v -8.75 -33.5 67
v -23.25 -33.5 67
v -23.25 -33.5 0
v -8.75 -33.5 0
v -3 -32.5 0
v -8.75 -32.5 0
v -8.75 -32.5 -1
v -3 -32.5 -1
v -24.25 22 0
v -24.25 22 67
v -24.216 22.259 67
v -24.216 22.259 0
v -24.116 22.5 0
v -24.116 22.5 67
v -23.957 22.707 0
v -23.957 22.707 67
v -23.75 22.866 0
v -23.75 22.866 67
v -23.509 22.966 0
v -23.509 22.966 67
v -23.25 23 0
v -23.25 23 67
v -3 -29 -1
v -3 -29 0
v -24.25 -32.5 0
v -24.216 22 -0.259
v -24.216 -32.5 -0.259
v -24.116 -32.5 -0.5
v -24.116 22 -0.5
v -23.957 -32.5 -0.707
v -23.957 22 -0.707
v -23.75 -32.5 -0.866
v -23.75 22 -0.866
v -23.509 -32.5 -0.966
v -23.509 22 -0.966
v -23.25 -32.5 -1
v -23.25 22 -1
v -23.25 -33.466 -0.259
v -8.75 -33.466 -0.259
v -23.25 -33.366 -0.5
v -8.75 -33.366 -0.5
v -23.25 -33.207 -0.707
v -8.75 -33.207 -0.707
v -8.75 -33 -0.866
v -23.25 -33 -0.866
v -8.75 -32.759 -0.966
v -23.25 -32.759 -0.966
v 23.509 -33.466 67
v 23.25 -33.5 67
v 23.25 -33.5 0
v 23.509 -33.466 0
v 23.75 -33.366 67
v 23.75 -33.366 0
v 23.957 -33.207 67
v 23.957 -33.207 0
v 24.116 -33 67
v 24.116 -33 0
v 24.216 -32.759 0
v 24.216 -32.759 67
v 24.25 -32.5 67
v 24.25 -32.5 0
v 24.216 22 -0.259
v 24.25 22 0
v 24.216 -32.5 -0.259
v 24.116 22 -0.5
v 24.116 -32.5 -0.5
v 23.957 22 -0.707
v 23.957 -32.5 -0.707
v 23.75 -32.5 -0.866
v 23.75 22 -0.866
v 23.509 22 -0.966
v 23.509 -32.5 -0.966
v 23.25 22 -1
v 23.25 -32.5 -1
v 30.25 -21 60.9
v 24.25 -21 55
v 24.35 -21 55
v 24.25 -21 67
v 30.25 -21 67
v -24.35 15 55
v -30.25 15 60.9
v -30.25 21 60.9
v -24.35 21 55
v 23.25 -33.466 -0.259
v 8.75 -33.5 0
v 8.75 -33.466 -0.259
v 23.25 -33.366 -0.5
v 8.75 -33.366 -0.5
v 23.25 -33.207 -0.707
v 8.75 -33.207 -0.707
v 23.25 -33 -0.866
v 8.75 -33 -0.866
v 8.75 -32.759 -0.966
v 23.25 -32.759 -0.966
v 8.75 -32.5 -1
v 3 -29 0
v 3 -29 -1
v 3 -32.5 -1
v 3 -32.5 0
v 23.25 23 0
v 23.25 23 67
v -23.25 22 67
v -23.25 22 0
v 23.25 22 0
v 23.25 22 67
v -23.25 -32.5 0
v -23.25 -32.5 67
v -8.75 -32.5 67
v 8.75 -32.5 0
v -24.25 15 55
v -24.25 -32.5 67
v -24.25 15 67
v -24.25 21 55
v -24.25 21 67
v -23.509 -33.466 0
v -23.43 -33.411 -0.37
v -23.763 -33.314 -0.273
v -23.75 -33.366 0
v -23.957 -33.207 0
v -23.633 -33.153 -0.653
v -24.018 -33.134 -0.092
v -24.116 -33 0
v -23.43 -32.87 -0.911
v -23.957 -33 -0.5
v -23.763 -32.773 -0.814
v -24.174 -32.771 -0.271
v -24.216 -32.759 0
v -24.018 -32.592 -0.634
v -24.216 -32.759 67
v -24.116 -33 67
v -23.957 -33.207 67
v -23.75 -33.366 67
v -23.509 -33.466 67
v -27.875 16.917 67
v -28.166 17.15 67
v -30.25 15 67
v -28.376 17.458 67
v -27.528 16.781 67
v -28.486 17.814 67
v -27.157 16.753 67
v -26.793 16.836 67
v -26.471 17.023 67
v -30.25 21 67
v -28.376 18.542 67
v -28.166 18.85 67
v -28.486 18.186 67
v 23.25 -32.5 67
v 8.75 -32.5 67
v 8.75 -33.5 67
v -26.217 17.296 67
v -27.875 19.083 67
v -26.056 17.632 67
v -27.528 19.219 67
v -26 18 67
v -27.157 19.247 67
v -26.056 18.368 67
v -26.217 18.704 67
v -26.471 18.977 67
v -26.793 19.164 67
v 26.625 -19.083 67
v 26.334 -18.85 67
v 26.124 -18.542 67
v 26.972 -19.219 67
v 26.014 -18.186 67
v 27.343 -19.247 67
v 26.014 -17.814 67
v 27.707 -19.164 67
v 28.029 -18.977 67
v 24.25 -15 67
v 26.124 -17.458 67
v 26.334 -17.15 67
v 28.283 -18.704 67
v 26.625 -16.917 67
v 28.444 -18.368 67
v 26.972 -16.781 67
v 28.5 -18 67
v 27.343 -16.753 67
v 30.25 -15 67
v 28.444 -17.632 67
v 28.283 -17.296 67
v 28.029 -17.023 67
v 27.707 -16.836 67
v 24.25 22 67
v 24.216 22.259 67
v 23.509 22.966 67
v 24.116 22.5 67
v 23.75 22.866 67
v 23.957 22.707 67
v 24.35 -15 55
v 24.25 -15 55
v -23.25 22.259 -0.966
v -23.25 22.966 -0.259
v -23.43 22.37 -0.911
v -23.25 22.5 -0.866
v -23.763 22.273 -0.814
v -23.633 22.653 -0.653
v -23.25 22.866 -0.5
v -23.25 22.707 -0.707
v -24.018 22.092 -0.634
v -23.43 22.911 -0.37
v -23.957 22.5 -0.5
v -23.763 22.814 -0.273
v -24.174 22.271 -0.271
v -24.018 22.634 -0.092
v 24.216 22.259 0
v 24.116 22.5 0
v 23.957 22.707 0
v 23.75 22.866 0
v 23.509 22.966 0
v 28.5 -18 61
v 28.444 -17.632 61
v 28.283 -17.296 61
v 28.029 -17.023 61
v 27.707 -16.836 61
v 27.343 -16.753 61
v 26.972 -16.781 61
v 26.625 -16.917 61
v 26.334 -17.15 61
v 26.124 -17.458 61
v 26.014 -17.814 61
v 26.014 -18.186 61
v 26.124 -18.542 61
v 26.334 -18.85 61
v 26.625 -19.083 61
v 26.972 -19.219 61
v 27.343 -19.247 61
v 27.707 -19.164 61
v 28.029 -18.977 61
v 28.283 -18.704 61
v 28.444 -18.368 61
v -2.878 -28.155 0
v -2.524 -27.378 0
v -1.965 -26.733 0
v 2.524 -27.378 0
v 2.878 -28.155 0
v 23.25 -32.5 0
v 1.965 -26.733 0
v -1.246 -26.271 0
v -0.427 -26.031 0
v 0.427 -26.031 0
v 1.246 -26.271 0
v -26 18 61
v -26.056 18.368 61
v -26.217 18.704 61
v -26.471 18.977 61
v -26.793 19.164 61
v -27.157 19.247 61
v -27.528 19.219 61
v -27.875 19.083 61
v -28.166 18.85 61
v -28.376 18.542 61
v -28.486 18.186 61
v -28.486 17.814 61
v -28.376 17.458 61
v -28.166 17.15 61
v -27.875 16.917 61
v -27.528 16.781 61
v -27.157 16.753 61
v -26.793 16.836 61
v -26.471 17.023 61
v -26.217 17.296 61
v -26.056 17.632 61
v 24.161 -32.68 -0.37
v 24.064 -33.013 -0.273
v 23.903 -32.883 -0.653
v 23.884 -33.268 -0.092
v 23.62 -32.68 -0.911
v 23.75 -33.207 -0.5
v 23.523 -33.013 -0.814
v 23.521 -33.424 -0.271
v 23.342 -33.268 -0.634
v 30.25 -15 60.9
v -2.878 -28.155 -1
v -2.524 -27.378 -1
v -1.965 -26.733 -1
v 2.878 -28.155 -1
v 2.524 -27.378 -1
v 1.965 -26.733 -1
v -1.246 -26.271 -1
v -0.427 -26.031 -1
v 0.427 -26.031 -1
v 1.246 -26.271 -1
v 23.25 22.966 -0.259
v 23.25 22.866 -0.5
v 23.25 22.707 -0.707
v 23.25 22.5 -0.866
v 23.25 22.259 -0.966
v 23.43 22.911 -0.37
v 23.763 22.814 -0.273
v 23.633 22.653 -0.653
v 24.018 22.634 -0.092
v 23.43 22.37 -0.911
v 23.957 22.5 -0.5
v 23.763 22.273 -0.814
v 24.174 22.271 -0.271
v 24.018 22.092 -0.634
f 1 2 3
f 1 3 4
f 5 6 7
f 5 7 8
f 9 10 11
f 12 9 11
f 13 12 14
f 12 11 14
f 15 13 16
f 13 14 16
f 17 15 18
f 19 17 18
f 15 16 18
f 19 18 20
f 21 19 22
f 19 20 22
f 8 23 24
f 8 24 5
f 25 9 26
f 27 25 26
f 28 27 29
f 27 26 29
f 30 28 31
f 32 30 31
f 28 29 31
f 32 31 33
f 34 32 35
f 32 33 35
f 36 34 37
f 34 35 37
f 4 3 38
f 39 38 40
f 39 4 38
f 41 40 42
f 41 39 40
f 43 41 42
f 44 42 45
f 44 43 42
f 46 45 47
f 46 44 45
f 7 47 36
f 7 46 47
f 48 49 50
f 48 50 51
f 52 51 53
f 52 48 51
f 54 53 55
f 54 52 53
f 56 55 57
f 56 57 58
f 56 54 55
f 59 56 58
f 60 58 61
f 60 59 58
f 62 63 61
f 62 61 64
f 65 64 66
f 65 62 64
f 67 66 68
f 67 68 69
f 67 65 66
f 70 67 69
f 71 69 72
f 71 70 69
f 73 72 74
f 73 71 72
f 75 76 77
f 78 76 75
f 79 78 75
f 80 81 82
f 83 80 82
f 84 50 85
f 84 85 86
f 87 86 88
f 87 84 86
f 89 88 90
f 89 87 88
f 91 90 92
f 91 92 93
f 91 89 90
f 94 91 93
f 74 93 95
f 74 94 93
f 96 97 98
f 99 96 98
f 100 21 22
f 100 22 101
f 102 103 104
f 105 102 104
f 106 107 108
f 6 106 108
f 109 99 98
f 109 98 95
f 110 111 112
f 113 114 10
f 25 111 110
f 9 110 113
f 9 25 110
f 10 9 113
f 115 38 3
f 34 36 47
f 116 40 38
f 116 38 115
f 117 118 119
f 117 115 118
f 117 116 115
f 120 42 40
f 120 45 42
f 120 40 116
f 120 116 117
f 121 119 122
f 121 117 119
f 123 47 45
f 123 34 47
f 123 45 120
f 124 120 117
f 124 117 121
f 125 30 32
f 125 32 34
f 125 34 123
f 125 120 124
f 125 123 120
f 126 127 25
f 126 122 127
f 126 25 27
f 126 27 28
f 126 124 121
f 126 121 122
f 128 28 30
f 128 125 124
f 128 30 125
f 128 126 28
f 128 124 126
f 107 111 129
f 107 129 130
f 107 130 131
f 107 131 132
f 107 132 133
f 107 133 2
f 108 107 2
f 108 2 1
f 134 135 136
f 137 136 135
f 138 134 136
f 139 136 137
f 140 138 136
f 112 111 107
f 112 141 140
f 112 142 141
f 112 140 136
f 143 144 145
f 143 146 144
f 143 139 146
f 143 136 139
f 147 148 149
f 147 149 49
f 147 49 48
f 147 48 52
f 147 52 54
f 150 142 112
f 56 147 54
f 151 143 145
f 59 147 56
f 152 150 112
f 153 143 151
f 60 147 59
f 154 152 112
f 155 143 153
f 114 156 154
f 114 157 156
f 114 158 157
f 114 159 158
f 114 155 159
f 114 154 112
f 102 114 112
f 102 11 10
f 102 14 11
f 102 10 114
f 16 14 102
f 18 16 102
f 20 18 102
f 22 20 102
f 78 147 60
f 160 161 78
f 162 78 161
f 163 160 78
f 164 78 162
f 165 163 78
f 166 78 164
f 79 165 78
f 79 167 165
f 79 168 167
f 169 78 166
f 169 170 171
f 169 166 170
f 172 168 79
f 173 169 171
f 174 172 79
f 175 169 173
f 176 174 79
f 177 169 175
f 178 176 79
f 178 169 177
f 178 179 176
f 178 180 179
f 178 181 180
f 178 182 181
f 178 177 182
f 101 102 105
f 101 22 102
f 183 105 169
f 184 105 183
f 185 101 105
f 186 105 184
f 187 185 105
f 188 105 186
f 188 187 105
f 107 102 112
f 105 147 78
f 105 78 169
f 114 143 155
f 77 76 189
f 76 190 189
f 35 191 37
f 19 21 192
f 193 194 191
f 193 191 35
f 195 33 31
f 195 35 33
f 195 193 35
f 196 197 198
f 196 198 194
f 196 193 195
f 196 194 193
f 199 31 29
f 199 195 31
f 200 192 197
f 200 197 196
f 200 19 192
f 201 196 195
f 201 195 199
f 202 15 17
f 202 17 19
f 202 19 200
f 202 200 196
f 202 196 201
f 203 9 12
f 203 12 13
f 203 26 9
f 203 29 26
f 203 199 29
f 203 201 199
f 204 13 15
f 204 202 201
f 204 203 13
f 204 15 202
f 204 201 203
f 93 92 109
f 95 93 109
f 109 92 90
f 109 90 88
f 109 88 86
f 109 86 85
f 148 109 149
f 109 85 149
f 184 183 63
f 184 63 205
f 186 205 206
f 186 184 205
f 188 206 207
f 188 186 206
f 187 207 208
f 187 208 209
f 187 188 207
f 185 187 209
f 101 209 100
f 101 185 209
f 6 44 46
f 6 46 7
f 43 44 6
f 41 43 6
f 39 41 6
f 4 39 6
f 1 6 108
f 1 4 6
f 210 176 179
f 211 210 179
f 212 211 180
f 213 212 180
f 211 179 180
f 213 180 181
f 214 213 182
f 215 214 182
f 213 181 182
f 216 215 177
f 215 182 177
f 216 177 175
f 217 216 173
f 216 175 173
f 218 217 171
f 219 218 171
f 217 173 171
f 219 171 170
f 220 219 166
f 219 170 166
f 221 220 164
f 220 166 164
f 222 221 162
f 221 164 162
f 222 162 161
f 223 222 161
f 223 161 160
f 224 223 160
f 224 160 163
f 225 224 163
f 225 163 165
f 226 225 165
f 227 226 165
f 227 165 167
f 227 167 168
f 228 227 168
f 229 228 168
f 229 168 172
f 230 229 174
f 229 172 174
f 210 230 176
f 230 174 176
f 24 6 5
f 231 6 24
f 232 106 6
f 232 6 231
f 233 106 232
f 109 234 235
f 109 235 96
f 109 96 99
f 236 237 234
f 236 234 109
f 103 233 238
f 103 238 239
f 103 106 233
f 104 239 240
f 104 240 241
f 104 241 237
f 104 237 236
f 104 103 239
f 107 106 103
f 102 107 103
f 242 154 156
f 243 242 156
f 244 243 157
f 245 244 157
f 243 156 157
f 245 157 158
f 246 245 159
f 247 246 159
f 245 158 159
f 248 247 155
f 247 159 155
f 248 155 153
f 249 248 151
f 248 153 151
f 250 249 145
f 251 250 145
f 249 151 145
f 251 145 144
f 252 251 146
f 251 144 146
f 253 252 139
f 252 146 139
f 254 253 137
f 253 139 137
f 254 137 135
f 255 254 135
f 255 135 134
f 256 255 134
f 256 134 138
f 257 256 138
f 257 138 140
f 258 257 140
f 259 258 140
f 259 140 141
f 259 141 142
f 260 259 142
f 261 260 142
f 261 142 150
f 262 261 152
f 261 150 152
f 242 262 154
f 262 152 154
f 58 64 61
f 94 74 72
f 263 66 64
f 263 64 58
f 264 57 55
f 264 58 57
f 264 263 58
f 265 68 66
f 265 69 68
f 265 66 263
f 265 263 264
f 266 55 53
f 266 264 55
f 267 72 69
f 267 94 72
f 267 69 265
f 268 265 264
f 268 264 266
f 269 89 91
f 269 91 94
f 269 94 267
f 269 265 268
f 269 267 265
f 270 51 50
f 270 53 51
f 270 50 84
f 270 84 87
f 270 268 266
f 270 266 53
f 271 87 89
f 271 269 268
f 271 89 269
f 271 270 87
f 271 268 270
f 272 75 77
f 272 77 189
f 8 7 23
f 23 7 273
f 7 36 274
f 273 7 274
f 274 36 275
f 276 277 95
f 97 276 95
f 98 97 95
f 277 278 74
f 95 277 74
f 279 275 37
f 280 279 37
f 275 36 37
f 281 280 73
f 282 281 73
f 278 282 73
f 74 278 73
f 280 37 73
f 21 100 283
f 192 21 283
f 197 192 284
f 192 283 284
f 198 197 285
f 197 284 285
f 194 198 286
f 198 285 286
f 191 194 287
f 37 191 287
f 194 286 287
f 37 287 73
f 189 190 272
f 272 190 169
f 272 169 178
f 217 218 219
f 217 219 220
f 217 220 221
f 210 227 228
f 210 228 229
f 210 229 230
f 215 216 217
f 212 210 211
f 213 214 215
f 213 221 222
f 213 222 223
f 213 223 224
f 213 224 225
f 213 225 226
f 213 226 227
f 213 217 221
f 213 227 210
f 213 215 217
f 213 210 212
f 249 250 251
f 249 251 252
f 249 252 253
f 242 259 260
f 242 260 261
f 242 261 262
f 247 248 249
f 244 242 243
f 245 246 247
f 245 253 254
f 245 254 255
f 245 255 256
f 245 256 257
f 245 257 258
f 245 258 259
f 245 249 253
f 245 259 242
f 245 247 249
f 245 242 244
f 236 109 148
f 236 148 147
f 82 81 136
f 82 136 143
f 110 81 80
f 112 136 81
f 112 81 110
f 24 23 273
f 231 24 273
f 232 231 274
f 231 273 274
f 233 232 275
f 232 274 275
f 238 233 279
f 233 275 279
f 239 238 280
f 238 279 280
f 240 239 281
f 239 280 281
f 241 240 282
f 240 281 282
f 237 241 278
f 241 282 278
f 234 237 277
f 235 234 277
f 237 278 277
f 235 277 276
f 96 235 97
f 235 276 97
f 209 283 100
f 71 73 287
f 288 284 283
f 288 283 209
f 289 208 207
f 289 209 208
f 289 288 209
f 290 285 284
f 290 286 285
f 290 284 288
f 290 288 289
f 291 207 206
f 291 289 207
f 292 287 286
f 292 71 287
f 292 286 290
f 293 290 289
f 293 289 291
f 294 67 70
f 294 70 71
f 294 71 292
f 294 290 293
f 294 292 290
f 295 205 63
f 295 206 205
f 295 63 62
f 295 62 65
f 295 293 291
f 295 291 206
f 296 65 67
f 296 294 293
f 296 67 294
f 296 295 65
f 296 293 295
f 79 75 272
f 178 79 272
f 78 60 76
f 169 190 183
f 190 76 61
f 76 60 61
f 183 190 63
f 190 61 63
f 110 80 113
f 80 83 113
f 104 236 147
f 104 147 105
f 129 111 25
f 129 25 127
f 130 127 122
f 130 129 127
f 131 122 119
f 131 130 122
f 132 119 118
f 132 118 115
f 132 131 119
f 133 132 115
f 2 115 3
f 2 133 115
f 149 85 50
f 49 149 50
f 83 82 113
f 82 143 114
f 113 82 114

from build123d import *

# Parameters (mm, degrees)
SKETCH_W        = 46.5
SKETCH_H        = 54.5
PAD_DEPTH       = 67
THICKNESS_T     = 1
SKETCH001_W     = 6
SKETCH001_H     = 6
PAD001_DEPTH    = 12
CHAMFER_SIZE    = 5.9
SKETCH002_R     = 1.25
POCKET_DEPTH    = 6
SKETCH003_W     = 17.5
SKETCH003_H     = 68
POCKET001_DEPTH = 1
POCKET002_DEPTH = 1


with BuildPart() as part:
    # Sketch → Pad (new body)
    with BuildSketch(Plane.XY):
        with Locations((0, -5.25)):
            Rectangle(SKETCH_W, SKETCH_H)
    extrude(amount=PAD_DEPTH)

    # Thickness
    thickness_openings = [part.faces().sort_by_distance(p)[0] for p in [
        (0, -5.25, 67),
    ]]
    offset(amount=THICKNESS_T, openings=thickness_openings)

    # Sketch001 → Pad001 (new body)
    with BuildSketch(Plane.XY.offset(67)):
        with Locations((-27.25, 18)):
            Rectangle(SKETCH001_W, SKETCH001_H)
        with Locations((27.25, -18)):
            Rectangle(SKETCH001_W, SKETCH001_H)
    extrude(amount=-PAD001_DEPTH)

    # Chamfer
    chamfer_edges = [part.edges().sort_by_distance(p)[0] for p in [
        (-30.25, 18, 55),
        (30.25, -18, 55),
    ]]
    chamfer(chamfer_edges, length=CHAMFER_SIZE)

    # Sketch002 → Pocket (cut)
    with BuildSketch(Plane.XY.offset(67)):
        with Locations((-27.25, 18)):
            Circle(SKETCH002_R)
        with Locations((27.25, -18)):
            Circle(SKETCH002_R)
    extrude(amount=-POCKET_DEPTH, mode=Mode.SUBTRACT)

    # Sketch003 → Pocket001 (cut)
    with BuildSketch(Plane.XZ.offset(33.5)):
        with Locations((0, 33)):
            Rectangle(SKETCH003_W, SKETCH003_H)
    extrude(amount=-POCKET001_DEPTH, mode=Mode.SUBTRACT)

    # Sketch004 → Pocket002 (cut)
    with BuildSketch(Plane(origin=(0, 0, -1), x_dir=(1, 0, 0), z_dir=(0, 0, -1))):
        with BuildLine():
            ThreePointArc((-3, 29), (0, 26), (3, 29))
            Line((3, 29), (3, 39))
            ThreePointArc((3, 39), (0, 42), (-3, 39))
            Line((-3, 29), (-3, 39))
        make_face()
    extrude(amount=-POCKET002_DEPTH, mode=Mode.SUBTRACT)


solid = part.part
